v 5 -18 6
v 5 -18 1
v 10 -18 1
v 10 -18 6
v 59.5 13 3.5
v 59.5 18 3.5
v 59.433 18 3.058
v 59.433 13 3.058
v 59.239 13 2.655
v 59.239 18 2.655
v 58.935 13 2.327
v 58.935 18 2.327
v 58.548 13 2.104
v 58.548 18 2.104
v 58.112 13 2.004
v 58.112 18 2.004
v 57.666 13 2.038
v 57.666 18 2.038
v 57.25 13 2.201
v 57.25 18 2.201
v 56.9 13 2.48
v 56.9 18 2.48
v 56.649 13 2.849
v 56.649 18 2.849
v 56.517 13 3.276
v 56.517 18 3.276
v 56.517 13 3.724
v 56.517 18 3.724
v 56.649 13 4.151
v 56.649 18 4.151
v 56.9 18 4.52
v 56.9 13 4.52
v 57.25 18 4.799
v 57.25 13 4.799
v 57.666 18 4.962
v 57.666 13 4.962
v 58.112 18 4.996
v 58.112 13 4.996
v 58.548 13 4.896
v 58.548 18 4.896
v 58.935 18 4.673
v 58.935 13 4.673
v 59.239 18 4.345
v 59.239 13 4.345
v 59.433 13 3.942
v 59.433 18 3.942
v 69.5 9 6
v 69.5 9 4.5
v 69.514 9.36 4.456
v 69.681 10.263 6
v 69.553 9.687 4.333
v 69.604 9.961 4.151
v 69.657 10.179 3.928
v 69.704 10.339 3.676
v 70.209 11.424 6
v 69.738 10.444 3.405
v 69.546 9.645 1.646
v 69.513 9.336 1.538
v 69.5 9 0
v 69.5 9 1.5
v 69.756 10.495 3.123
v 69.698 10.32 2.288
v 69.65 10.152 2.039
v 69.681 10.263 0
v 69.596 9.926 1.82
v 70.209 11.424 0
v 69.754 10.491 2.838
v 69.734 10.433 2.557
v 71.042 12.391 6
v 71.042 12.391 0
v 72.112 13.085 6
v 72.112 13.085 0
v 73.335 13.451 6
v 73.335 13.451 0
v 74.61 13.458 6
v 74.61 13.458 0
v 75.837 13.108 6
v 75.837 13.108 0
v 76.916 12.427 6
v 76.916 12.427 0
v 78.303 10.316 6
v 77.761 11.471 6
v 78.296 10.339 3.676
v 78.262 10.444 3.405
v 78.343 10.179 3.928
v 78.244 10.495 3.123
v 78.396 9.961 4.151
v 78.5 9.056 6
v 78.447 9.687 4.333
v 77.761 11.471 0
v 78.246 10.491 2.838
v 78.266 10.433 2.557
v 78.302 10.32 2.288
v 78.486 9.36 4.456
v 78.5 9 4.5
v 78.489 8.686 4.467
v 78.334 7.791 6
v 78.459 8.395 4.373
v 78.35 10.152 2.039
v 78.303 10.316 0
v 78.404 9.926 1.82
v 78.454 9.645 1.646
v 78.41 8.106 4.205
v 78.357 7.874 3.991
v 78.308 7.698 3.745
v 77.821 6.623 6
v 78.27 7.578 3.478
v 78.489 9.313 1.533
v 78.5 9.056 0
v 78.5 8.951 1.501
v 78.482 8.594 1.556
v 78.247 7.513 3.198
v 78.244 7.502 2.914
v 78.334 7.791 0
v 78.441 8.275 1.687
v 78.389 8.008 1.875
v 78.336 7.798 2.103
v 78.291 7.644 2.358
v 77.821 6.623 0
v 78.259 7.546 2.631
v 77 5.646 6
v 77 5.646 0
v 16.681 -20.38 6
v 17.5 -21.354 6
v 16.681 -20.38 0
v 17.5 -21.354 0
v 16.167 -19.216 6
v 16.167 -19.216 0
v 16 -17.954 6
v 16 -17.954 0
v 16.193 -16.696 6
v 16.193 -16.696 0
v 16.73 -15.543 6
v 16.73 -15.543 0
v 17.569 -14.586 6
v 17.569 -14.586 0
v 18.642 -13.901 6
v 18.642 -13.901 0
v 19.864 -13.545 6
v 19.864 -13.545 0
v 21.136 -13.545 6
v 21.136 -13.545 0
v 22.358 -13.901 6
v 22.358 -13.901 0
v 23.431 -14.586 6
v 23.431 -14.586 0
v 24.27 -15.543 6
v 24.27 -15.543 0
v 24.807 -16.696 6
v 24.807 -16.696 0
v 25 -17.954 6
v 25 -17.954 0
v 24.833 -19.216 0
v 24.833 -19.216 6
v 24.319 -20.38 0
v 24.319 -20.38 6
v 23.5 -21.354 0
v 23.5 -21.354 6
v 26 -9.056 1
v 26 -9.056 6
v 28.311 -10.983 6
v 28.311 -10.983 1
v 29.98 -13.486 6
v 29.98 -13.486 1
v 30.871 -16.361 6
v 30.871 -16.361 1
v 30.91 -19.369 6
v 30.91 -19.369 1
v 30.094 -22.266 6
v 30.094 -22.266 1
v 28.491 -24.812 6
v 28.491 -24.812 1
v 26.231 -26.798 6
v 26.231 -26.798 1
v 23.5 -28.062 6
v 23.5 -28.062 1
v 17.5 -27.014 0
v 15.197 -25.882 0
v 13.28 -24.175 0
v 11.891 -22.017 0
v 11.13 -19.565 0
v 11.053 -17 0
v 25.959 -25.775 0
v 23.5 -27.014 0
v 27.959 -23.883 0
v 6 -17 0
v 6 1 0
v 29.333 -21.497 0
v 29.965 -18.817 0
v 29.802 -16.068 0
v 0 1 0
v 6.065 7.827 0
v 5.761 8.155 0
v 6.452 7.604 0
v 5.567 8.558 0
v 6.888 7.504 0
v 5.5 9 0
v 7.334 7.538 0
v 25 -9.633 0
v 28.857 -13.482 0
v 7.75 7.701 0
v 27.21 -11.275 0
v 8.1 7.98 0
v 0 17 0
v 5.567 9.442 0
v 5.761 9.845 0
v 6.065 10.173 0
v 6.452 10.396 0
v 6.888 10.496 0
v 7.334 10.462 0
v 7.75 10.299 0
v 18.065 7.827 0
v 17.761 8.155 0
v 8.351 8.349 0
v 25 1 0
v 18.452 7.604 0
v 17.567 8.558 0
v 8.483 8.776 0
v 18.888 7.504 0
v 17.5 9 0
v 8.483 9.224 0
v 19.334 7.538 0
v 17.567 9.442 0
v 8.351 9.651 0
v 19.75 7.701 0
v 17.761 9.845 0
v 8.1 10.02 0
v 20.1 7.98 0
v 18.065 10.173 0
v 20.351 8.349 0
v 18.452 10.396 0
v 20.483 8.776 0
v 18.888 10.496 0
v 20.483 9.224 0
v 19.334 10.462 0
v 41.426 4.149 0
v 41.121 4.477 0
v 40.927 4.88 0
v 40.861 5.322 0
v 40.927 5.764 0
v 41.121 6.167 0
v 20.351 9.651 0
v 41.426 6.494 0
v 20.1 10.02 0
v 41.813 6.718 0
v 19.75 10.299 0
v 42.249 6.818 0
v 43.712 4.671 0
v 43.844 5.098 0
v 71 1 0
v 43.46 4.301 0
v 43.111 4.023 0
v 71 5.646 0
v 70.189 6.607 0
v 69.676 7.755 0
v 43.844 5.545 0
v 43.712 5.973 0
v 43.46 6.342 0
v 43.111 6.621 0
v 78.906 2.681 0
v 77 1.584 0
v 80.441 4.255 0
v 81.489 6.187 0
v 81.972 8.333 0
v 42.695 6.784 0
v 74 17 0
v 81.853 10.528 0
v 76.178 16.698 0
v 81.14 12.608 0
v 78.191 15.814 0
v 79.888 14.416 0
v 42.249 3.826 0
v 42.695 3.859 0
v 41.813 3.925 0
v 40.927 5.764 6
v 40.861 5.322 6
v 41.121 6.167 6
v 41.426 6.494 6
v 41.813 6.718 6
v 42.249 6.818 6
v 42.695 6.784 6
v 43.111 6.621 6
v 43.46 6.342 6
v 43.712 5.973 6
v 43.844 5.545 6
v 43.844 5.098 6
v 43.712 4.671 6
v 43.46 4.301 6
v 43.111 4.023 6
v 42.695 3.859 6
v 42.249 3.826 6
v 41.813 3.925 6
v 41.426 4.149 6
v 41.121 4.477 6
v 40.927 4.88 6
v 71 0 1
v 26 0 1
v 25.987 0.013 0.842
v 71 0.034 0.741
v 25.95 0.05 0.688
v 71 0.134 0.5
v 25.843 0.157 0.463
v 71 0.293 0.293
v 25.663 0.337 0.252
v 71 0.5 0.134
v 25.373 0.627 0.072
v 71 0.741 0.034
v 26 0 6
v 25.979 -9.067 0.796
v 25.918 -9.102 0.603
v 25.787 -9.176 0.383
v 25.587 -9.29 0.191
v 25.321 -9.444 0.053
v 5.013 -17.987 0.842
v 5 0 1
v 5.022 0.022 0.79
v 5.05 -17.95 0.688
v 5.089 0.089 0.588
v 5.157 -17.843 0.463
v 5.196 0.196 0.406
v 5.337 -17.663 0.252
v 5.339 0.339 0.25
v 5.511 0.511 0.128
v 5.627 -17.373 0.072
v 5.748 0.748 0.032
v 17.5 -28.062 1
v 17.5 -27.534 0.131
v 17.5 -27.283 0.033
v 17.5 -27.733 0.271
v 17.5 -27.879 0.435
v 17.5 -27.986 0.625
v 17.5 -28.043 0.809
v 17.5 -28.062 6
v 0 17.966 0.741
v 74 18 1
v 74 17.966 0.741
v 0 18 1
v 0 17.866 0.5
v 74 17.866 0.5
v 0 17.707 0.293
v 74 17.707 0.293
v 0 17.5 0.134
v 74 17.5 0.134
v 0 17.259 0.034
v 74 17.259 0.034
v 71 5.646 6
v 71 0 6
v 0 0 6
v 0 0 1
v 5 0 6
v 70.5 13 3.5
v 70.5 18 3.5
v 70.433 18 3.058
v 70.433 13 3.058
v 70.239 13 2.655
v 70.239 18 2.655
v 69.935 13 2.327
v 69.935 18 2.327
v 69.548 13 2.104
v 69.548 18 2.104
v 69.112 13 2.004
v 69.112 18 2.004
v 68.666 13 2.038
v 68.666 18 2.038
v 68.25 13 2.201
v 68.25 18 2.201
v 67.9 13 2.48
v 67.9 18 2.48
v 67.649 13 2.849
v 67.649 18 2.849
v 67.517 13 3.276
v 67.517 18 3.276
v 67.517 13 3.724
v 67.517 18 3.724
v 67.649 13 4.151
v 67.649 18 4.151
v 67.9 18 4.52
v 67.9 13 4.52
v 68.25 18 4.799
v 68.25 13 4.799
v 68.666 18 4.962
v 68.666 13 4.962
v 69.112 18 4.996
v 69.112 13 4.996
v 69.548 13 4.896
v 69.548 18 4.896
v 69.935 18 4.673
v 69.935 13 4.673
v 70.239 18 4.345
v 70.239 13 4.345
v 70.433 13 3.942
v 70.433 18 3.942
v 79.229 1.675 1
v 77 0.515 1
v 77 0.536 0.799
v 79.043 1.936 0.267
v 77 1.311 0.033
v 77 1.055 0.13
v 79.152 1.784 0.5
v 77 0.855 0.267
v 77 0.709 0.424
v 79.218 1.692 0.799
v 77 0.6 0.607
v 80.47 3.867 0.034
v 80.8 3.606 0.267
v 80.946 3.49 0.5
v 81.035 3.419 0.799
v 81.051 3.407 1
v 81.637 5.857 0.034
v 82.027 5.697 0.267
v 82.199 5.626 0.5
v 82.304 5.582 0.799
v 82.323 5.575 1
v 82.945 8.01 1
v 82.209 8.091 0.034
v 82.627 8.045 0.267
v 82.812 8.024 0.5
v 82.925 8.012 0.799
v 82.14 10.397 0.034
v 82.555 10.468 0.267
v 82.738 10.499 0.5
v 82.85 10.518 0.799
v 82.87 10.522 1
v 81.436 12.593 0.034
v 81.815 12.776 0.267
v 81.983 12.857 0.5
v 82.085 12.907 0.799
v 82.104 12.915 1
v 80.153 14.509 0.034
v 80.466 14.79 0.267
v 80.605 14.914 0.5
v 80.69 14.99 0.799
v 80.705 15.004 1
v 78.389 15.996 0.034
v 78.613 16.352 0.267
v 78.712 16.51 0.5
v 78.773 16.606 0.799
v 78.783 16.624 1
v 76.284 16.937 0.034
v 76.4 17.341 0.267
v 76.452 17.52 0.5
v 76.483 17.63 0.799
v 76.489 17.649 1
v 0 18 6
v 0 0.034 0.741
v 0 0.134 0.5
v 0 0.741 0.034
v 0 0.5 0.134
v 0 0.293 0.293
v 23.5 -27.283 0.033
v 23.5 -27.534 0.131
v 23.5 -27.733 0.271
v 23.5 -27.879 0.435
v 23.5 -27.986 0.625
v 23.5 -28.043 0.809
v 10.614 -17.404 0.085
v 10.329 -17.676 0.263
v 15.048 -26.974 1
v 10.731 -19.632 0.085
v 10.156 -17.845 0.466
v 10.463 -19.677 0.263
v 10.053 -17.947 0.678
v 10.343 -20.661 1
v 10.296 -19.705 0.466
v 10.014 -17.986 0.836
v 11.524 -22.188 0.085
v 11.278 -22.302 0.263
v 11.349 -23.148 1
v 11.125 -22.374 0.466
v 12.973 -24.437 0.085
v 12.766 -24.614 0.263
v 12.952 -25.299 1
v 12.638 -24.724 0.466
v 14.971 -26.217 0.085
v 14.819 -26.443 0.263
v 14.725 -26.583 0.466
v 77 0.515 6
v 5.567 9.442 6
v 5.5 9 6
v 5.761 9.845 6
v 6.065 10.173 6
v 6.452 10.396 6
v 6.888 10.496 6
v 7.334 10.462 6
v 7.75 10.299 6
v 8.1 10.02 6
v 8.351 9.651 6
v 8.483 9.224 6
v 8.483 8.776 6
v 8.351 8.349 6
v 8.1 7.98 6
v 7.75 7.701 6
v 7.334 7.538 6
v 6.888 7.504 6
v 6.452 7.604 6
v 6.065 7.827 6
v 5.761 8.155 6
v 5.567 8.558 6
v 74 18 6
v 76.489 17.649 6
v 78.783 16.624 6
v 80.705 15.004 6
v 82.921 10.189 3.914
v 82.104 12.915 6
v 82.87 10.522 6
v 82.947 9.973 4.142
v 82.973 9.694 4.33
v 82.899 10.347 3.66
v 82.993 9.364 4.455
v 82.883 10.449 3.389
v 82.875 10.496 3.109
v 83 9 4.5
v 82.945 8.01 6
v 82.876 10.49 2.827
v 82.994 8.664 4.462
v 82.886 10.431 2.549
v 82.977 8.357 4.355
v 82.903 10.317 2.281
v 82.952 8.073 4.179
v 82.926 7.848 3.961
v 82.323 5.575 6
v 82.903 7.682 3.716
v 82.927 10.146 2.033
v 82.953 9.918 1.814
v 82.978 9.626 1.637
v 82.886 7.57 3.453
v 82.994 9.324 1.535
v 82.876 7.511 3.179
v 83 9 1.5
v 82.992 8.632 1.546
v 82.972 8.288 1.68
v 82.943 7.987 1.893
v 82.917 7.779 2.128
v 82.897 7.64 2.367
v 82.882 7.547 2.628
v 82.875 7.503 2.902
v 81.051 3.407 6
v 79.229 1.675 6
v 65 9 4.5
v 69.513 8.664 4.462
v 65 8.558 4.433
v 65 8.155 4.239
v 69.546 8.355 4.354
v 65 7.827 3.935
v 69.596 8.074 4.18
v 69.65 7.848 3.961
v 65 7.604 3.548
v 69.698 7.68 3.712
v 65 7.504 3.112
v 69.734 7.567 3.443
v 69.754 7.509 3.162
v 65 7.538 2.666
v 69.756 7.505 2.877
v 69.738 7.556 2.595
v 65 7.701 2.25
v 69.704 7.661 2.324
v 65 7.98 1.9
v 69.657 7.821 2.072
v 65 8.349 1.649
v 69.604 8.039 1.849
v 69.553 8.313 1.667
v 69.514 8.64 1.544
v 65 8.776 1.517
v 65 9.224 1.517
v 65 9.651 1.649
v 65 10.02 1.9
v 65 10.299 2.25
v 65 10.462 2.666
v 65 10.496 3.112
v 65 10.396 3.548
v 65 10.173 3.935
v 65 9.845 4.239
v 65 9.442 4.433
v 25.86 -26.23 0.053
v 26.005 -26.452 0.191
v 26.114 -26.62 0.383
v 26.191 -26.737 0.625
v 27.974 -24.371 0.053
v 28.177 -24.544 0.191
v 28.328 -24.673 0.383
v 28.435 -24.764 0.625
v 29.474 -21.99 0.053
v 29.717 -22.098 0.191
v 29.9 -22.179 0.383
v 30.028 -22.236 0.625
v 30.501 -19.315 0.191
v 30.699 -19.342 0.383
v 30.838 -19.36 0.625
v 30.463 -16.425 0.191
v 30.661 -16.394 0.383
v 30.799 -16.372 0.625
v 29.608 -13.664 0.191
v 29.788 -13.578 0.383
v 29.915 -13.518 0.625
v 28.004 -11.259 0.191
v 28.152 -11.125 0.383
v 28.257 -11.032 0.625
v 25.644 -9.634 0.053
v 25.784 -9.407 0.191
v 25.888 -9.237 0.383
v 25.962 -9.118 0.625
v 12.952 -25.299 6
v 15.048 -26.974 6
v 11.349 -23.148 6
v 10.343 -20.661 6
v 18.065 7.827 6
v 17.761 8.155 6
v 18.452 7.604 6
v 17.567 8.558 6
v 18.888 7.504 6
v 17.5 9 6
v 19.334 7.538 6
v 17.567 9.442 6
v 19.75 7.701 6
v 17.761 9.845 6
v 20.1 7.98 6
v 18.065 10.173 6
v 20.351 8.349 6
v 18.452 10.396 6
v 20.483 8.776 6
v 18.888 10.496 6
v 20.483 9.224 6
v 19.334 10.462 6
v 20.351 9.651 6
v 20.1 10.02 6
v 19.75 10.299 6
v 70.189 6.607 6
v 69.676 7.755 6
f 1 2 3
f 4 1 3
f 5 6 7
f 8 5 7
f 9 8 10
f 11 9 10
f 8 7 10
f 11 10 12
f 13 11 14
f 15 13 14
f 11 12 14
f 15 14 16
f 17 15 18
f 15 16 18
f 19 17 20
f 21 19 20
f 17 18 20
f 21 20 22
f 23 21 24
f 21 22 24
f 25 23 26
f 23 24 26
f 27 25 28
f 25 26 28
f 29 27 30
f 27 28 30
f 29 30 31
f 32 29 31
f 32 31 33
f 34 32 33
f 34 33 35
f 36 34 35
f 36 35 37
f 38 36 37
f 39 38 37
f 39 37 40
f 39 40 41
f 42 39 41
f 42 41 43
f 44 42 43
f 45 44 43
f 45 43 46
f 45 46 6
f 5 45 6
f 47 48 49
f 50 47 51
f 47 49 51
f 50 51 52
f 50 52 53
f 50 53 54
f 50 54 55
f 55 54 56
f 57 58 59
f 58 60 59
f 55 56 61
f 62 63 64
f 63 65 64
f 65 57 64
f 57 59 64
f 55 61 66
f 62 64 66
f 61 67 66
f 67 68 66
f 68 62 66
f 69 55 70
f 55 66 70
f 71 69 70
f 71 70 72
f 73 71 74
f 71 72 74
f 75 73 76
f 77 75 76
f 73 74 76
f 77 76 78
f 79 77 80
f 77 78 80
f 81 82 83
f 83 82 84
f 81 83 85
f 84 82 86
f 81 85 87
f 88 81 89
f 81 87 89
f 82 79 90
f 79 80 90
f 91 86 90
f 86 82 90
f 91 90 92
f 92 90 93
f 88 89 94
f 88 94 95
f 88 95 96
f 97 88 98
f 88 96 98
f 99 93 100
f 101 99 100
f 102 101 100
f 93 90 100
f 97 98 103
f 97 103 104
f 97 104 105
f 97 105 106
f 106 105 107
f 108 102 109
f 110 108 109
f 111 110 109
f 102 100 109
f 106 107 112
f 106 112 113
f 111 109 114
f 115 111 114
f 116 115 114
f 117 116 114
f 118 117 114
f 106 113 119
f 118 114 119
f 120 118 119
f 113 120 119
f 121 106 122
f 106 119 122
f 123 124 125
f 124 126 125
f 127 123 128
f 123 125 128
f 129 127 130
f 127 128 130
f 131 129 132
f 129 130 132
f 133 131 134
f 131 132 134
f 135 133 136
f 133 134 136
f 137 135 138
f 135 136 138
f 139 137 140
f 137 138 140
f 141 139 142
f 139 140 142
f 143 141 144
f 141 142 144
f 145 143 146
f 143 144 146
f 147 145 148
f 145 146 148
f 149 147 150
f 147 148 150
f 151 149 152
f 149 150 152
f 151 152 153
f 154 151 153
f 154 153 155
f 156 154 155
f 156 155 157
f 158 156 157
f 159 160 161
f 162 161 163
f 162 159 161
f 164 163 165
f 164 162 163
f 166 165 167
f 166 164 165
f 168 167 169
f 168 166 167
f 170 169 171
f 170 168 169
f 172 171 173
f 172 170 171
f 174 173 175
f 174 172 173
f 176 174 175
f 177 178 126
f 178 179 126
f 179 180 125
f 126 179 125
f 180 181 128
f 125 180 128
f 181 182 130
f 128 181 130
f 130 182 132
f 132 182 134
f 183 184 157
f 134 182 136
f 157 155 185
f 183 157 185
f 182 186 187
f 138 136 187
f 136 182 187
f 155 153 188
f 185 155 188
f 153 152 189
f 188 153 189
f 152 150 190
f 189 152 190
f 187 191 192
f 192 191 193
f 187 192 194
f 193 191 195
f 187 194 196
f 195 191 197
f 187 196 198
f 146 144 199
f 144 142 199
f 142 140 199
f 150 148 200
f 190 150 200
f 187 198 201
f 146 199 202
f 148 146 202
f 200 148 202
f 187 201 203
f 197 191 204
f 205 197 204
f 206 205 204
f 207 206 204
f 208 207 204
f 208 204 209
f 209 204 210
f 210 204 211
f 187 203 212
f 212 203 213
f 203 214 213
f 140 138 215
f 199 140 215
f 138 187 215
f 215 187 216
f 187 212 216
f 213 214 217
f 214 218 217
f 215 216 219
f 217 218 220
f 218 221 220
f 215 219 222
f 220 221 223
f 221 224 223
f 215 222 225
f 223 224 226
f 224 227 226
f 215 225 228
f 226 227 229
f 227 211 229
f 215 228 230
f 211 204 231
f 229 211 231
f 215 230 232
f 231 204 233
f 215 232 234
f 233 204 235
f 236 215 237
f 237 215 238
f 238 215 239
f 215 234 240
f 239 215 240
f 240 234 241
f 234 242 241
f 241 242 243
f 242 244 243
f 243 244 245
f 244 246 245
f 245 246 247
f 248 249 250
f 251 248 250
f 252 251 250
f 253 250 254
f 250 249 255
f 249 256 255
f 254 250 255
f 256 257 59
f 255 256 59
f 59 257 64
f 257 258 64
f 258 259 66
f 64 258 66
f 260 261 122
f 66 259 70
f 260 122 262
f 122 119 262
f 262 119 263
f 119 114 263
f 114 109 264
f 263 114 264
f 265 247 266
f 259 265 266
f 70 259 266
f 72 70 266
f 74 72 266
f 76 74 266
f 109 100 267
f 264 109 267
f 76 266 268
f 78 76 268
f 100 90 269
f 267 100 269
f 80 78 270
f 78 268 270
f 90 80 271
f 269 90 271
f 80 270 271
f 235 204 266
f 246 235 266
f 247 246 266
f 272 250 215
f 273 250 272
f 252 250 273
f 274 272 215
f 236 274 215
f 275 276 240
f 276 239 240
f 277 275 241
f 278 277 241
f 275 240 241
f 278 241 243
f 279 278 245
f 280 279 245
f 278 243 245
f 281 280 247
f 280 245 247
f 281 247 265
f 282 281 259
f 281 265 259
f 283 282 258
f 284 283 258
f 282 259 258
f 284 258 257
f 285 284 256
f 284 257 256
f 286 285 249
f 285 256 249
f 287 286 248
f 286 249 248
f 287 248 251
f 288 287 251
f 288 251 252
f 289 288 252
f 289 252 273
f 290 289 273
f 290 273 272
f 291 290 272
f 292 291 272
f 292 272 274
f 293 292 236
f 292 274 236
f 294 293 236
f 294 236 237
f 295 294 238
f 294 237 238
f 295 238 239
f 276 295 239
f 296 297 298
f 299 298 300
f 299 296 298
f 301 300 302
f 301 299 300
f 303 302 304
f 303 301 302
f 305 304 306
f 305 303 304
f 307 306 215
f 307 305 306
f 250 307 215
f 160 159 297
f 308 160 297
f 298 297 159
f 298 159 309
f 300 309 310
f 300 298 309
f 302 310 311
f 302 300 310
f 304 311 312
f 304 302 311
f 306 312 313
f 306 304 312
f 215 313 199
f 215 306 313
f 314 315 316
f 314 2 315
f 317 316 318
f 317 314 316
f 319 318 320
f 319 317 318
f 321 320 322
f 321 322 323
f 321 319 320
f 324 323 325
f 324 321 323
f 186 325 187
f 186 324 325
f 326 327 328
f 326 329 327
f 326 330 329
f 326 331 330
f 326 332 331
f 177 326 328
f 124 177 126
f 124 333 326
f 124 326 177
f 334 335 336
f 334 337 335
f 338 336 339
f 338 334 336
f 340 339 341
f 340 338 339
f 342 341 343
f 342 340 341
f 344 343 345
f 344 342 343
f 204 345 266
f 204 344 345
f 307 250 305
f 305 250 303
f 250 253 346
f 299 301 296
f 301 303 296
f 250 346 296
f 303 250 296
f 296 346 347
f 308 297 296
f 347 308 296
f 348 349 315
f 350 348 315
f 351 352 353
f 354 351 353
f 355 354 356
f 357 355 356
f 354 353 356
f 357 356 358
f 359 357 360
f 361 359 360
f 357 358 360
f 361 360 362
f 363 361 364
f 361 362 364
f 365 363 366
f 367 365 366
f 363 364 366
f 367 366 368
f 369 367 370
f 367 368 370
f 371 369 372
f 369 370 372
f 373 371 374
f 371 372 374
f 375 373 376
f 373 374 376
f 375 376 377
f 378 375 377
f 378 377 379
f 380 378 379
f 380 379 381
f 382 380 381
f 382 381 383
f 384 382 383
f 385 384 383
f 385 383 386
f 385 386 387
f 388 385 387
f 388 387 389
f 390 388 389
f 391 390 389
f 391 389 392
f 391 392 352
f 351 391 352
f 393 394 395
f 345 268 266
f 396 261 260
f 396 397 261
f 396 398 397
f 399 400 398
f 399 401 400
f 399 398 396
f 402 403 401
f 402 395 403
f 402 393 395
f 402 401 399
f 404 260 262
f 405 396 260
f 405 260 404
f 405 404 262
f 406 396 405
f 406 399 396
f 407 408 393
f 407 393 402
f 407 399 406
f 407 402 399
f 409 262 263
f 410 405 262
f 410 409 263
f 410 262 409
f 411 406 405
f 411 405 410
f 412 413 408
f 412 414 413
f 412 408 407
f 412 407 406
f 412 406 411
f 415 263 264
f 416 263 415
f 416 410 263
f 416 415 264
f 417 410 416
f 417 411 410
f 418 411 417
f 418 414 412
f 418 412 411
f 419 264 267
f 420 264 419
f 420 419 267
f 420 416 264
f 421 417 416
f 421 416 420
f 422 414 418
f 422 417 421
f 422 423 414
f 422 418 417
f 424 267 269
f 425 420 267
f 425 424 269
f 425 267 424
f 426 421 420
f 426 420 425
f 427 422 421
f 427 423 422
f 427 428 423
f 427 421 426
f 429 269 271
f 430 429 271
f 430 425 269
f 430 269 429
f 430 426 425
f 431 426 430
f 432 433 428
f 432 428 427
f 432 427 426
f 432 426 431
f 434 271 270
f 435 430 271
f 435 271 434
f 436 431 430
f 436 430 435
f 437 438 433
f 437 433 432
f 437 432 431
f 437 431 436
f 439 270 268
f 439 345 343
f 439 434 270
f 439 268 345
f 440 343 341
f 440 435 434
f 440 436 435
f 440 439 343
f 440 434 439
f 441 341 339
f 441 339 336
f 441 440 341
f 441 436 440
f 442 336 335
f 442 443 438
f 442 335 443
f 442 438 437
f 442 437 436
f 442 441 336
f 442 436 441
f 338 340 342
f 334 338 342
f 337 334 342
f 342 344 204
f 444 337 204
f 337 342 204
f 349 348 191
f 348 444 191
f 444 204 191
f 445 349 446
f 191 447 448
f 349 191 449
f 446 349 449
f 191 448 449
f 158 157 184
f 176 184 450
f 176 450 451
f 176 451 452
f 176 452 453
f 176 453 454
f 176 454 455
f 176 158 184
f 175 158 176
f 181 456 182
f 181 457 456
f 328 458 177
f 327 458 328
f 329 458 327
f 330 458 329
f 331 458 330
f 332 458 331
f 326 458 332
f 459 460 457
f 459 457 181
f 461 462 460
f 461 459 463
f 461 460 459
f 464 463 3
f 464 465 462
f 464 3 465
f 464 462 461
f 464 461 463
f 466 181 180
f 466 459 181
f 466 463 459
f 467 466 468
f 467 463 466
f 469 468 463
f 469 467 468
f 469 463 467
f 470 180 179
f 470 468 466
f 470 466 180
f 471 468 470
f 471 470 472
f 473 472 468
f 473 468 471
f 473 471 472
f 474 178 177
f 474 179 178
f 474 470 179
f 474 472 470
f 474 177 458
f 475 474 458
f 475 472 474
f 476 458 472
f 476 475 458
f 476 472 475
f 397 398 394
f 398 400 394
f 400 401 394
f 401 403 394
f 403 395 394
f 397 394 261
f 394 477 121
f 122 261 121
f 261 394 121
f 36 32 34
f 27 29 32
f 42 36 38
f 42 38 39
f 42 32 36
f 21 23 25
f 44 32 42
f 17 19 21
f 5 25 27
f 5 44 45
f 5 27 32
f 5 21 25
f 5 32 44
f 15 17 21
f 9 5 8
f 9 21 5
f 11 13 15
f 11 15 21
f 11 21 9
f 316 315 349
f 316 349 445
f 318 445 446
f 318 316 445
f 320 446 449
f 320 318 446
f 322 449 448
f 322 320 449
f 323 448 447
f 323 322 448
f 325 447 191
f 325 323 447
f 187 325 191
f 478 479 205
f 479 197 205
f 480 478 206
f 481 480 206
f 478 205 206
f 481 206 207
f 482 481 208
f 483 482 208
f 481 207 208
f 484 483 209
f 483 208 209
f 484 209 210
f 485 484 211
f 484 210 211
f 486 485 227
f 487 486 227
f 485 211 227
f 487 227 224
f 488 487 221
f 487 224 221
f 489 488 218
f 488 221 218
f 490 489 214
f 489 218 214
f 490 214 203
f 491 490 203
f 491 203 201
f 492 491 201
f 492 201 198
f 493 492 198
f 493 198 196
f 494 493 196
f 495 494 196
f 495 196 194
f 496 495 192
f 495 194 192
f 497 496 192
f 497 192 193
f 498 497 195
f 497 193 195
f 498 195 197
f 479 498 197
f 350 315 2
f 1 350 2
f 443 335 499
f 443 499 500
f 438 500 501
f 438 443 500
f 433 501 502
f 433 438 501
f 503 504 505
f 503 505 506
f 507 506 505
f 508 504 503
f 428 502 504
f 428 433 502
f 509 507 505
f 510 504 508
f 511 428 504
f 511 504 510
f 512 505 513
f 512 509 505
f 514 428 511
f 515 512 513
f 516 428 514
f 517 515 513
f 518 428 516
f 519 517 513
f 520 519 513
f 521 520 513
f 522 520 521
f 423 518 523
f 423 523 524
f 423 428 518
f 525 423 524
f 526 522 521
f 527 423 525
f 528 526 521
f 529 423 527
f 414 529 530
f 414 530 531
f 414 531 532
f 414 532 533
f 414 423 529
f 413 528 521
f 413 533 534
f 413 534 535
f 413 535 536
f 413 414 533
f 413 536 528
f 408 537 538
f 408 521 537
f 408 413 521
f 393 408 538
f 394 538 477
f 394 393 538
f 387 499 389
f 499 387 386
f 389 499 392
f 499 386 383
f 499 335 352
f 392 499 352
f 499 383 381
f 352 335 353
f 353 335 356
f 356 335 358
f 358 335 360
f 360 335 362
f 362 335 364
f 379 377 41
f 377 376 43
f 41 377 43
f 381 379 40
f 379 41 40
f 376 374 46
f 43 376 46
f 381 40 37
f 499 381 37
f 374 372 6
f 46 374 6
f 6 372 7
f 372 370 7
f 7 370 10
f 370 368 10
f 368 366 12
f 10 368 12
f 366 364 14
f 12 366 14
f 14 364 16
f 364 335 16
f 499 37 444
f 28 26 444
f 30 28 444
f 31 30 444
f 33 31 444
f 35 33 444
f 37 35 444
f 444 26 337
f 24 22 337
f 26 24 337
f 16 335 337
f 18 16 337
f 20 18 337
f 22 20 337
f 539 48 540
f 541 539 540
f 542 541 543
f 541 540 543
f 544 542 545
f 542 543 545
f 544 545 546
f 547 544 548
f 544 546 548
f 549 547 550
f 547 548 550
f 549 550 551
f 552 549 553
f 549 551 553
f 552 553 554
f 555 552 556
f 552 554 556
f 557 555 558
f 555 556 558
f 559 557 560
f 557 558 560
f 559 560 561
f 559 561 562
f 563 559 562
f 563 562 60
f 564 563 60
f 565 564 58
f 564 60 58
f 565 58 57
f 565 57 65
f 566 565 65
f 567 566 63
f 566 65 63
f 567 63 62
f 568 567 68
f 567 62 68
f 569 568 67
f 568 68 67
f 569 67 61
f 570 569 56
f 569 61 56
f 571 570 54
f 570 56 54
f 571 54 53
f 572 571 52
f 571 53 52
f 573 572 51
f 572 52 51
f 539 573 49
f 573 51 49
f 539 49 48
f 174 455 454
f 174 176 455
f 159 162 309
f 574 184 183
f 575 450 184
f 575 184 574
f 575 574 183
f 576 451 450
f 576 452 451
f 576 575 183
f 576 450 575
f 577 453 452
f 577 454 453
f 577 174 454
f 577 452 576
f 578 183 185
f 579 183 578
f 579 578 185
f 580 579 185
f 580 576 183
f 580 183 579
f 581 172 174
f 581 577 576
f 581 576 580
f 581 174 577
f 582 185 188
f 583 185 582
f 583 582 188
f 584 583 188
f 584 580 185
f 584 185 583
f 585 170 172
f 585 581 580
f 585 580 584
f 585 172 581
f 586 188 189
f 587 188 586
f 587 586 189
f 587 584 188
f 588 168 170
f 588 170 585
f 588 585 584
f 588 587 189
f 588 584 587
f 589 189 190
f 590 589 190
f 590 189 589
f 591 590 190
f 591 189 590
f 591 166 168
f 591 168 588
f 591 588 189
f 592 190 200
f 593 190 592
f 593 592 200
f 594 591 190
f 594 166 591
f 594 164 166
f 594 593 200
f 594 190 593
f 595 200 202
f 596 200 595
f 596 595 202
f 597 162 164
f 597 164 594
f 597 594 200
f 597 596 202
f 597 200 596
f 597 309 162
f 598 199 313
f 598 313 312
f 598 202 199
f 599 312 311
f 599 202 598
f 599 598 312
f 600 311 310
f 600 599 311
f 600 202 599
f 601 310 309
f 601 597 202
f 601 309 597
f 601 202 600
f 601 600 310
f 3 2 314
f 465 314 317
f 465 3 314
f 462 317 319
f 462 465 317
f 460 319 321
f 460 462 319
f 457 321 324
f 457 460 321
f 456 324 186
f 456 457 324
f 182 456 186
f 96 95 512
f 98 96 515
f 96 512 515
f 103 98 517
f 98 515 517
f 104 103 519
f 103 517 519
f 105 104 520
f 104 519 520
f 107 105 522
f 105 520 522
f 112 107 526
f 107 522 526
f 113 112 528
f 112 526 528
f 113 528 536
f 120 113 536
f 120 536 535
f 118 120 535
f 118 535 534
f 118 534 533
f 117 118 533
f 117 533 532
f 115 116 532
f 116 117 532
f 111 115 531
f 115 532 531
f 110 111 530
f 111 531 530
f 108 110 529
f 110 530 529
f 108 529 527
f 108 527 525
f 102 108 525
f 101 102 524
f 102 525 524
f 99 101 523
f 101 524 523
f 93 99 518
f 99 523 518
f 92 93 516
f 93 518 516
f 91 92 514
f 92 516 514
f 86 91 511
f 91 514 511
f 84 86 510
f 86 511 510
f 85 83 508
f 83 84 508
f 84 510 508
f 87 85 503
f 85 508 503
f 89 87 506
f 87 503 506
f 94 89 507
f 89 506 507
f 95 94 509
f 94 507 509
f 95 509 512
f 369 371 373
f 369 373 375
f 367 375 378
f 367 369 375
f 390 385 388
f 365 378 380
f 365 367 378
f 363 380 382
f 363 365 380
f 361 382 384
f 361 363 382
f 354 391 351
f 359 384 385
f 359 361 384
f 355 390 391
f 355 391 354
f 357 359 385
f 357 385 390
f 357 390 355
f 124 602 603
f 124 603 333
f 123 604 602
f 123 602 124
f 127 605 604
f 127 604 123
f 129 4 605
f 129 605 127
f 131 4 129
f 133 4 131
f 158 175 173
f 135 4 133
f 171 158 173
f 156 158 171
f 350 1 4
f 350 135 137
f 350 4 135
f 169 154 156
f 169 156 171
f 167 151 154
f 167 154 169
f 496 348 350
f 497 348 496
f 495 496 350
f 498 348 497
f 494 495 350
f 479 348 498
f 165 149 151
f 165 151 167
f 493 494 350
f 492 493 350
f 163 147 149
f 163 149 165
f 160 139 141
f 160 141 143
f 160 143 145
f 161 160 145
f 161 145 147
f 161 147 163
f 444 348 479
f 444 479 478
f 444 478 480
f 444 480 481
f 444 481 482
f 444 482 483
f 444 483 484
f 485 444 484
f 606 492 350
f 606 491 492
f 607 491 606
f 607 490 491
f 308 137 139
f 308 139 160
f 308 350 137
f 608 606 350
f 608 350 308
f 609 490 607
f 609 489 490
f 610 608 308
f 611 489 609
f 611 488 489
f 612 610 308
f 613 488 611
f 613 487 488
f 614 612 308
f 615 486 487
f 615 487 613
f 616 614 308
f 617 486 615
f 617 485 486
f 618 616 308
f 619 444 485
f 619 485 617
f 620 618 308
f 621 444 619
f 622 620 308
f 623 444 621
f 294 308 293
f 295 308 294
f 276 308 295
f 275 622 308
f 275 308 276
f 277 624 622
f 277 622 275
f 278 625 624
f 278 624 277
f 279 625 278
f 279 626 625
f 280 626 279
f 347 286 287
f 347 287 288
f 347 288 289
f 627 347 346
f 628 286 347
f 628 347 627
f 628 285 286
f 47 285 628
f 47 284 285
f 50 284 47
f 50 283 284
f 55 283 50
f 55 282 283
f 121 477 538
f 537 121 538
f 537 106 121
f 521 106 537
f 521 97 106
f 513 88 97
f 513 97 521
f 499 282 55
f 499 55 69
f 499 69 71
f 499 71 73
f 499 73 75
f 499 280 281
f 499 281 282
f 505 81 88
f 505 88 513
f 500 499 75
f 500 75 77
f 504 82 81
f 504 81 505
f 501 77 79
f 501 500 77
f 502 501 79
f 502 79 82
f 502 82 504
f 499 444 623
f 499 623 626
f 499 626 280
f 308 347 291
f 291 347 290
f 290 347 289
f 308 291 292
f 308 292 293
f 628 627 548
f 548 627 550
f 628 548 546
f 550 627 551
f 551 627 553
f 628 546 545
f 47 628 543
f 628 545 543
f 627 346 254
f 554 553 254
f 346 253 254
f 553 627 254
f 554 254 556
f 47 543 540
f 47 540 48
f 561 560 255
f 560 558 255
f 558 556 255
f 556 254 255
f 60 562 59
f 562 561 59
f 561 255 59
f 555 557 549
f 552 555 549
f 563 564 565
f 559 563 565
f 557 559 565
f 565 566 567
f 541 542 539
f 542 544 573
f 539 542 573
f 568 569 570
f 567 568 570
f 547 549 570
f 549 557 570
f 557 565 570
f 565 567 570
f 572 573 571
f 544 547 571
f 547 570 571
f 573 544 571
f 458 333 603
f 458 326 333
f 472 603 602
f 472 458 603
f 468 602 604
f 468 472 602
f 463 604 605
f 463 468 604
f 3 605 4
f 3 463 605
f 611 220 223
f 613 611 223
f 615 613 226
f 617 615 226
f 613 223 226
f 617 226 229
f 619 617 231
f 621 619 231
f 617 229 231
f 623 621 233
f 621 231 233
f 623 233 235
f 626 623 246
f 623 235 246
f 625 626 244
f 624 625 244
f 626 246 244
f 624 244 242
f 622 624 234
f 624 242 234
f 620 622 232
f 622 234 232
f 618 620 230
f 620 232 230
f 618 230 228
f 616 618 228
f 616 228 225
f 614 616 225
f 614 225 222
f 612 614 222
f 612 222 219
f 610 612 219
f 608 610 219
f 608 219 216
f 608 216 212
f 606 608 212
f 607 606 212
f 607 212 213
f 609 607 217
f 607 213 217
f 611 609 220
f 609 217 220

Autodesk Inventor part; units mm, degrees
ref_plane "YZ Plane" through (0, 0, 0) normal (1, 0, 0) x (0, 1, 0)
ref_plane "XZ Plane" through (0, 0, 0) normal (0, 1, 0) x (-1, 0, 0)
sketch "Sketch1" plane through (0, 0, 0) normal (0, 0, 1) x (1, 0, 0)
  line L0 (0, 0) -> (5, 0)
  line L1 (5, 0) -> (5, -18)
  line L2 (5, -18) -> (26, -18)
  line L3 (26, -18) -> (26, 0)
  line L4 (26, 0) -> (74, 0)
  arc A0 (74, 0) -> (74, 18) centre (74, 9) ccw
  line L5 (74, 18) -> (0, 18)
  line L6 (0, 18) -> (0, 0)
  circle A1 centre (20.5, -18) radius 10.5
  dimension "d0" = 5
  dimension "d1" = 18
  dimension "d2" = 21
  dimension "d3" = 18
  dimension "d4" = 48
  dimension "d5" = 18
  dimension "d6" = 9
  dimension "d7" = 74
  dimension "d8" = 21
extrude "Extrusion1" add sketch "Sketch1" along normal blind 6
sketch "Sketch2" plane through (0, 0, 0) normal (0, 0, -1) x (-1, 0, 0)
  circle A0 centre (-74, 9) radius 4.5
  arc A1 (-26, -9.0557) -> (-10, -18) centre (-20.5, -18) ccw projected
  circle A2 centre (-20.5, -18) radius 4.5
  point P0 (0, 0)
  dimension "d11" = 9
  dimension "d12" = 9
extrude "Extrusion2" cut sketch "Sketch2" against normal through all
sketch "Sketch3" plane through (0, 0, 0) normal (0, 0, -1) x (-1, 0, 0)
  circle A0 centre (-7, 9) radius 1.5
  circle A1 centre (-19, 9) radius 1.5
  point P0 (0, 0)
  dimension "d16" = 3
  dimension "d17" = 3
extrude "Extrusion3" cut sketch "Sketch3" against normal through all
ref_plane "Work Plane1" through (83, 0, 0) normal (-1, 0, 0) x (0, 0, 1)
sketch "Sketch4" plane through (83, 0, 0) normal (-1, 0, 0) x (0, 0, 1)
  circle A0 centre (3, 9) radius 1.5
  point P0 (0, 0)
  dimension "d22" = 3
extrude "Extrusion4" cut sketch "Sketch4" along normal blind 18
fillet "Fillet3" radius 1 8 edges at (83, 9, 0) (50, 0, 0) (37, 18, 0) (2.5, 0, 0) (5, -9, 0) (25.6235, -27.1652, 0) (7.5, -18, 0) (26, -4.5279, 0)
sketch "Sketch5" plane through (0, 18, 6) normal (0, 1, 0) x (1, 0, 0)
  circle A0 centre (69, 2.5) radius 1.5
  circle A1 centre (58, 2.5) radius 1.5
  point P0 (0, 6)
  dimension "d26" = 3
  dimension "d27" = 3
extrude "Extrusion5" cut sketch "Sketch5" against normal blind 5
sketch "Sketch6" plane through (0, 0, 6) normal (0, 0, 1) x (1, 0, 0)
  line L0 (71, 0) -> (77, 0)
  line L1 (77, 0) -> (77, 6)
  line L2 (77, 6) -> (71, 6)
  line L3 (71, 6) -> (71, 0)
  line L4 (17.5, -18) -> (23.5, -18)
  line L5 (23.5, -18) -> (23.5, -29)
  line L6 (23.5, -29) -> (17.5, -29)
  line L7 (17.5, -29) -> (17.5, -18)
  point P0 (0, 0)
  dimension "d30" = 6
  dimension "d31" = 6
  dimension "d32" = 6
  dimension "d33" = 11
extrude "Extrusion6" cut sketch "Sketch6" against normal through all
sketch "Sketch7" plane through (0, 0, 0) normal (0, 0, -1) x (-1, 0, 0)
  arc A0 (-38.7148, 11.0023) -> (-38.2652, 13.3358) centre (-45.6076, 13.5402) ccw projected
  arc A1 (-38.1755, 10.6175) -> (-38.7148, 11.0023) centre (-42.3608, 5.3217) ccw projected
  arc A2 (-36.1152, 11.8018) -> (-38.1755, 10.6175) centre (-33.5331, 4.9255) ccw projected
  arc A3 (-35.5101, 11.1585) -> (-36.1152, 11.8018) centre (-42.3608, 5.3217) ccw projected
  arc A4 (-36.8185, 9.1746) -> (-35.5101, 11.1585) centre (-42.2153, 14.1571) ccw projected
  arc A5 (-36.4675, 8.6128) -> (-36.8185, 9.1746) centre (-42.3608, 5.3217) ccw projected
  arc A6 (-34.1108, 8.9185) -> (-36.4675, 8.6128) centre (-34.3567, 1.5774) ccw projected
  arc A7 (-33.798, 8.0925) -> (-34.1108, 8.9185) centre (-42.3608, 5.3217) ccw projected
  arc A8 (-35.7659, 6.7603) -> (-33.798, 8.0925) centre (-38.8453, 13.4288) ccw projected
  arc A9 (-35.6566, 6.107) -> (-35.7659, 6.7603) centre (-42.3608, 5.3217) ccw projected
  arc A10 (-33.3623, 5.4875) -> (-35.6566, 6.107) centre (-36.3988, -1.2006) ccw projected
  arc A11 (-33.3894, 4.6047) -> (-33.3623, 5.4875) centre (-42.3608, 5.3217) ccw projected
  arc A12 (-35.7174, 4.1271) -> (-33.3894, 4.6047) centre (-36.0104, 11.4664) ccw projected
  arc A13 (-35.8664, 3.4816) -> (-35.7174, 4.1271) centre (-42.3608, 5.3217) ccw projected
  arc A14 (-33.9838, 2.0314) -> (-35.8664, 3.4816) centre (-39.3486, -2.9857) ccw projected
  arc A15 (-34.3467, 1.2261) -> (-33.9838, 2.0314) centre (-42.3608, 5.3217) ccw projected
  arc A16 (-36.6802, 1.6757) -> (-34.3467, 1.2261) centre (-34.1423, 8.5684) ccw projected
  arc A17 (-37.0649, 1.1364) -> (-36.6802, 1.6757) centre (-42.3608, 5.3217) ccw projected
  arc A18 (-35.8806, -0.9239) -> (-37.0649, 1.1364) centre (-42.757, -3.506) ccw projected
  arc A19 (-36.524, -1.529) -> (-35.8806, -0.9239) centre (-42.3608, 5.3217) ccw projected
  arc A20 (-38.5079, -0.2207) -> (-36.524, -1.529) centre (-33.5254, 5.1762) ccw projected
  arc A21 (-39.0697, -0.5716) -> (-38.5079, -0.2207) centre (-42.3608, 5.3217) ccw projected
  arc A22 (-38.764, -2.9284) -> (-39.0697, -0.5716) centre (-46.105, -2.6824) ccw projected
  arc A23 (-39.59, -3.2412) -> (-38.764, -2.9284) centre (-42.3608, 5.3217) ccw projected
  arc A24 (-40.9222, -1.2732) -> (-39.59, -3.2412) centre (-34.2536, 1.8061) ccw projected
  arc A25 (-41.5755, -1.3825) -> (-40.9222, -1.2732) centre (-42.3608, 5.3217) ccw projected
  arc A26 (-42.1949, -3.6768) -> (-41.5755, -1.3825) centre (-48.8831, -0.6403) ccw projected
  arc A27 (-43.0777, -3.6497) -> (-42.1949, -3.6768) centre (-42.3608, 5.3217) ccw projected
  arc A28 (-43.5554, -1.3218) -> (-43.0777, -3.6497) centre (-36.2161, -1.0287) ccw projected
  arc A29 (-44.2008, -1.1727) -> (-43.5554, -1.3218) centre (-42.3608, 5.3217) ccw projected
  arc A30 (-45.6511, -3.0553) -> (-44.2008, -1.1727) centre (-50.6681, 2.3095) ccw projected
  arc A31 (-46.4564, -2.6925) -> (-45.6511, -3.0553) centre (-42.3608, 5.3217) ccw projected
  arc A32 (-46.0068, -0.3589) -> (-46.4564, -2.6925) centre (-39.114, -2.8968) ccw projected
  arc A33 (-46.5461, 0.0258) -> (-46.0068, -0.3589) centre (-42.3608, 5.3217) ccw projected
  arc A34 (-48.6064, -1.1585) -> (-46.5461, 0.0258) centre (-51.1885, 5.7179) ccw projected
  arc A35 (-49.2115, -0.5151) -> (-48.6064, -1.1585) centre (-42.3608, 5.3217) ccw projected
  arc A36 (-47.9032, 1.4688) -> (-49.2115, -0.5151) centre (-42.5063, -3.5137) ccw projected
  arc A37 (-48.2541, 2.0306) -> (-47.9032, 1.4688) centre (-42.3608, 5.3217) ccw projected
  arc A38 (-50.6108, 1.7249) -> (-48.2541, 2.0306) centre (-50.3649, 9.0659) ccw projected
  arc A39 (-50.9237, 2.5508) -> (-50.6108, 1.7249) centre (-42.3608, 5.3217) ccw projected
  arc A40 (-48.9557, 3.883) -> (-50.9237, 2.5508) centre (-45.8763, -2.7855) ccw projected
  arc A41 (-49.065, 4.5364) -> (-48.9557, 3.883) centre (-42.3608, 5.3217) ccw projected
  arc A42 (-51.3593, 5.1558) -> (-49.065, 4.5364) centre (-48.3228, 11.8439) ccw projected
  arc A43 (-51.3322, 6.0386) -> (-51.3593, 5.1558) centre (-42.3608, 5.3217) ccw projected
  arc A44 (-49.0043, 6.5163) -> (-51.3322, 6.0386) centre (-48.7112, -0.823) ccw projected
  arc A45 (-48.8552, 7.1617) -> (-49.0043, 6.5163) centre (-42.3608, 5.3217) ccw projected
  arc A46 (-50.7378, 8.612) -> (-48.8552, 7.1617) centre (-45.373, 13.629) ccw projected
  arc A47 (-50.3749, 9.4172) -> (-50.7378, 8.612) centre (-42.3608, 5.3217) ccw projected
  arc A48 (-48.0414, 8.9677) -> (-50.3749, 9.4172) centre (-50.5793, 2.0749) ccw projected
  arc A49 (-47.6567, 9.5069) -> (-48.0414, 8.9677) centre (-42.3608, 5.3217) ccw projected
  arc A50 (-48.841, 11.5673) -> (-47.6567, 9.5069) centre (-41.9646, 14.1494) ccw projected
  arc A51 (-48.1976, 12.1724) -> (-48.841, 11.5673) centre (-42.3608, 5.3217) ccw projected
  arc A52 (-46.2137, 10.864) -> (-48.1976, 12.1724) centre (-51.1962, 5.4671) ccw projected
  arc A53 (-45.6519, 11.215) -> (-46.2137, 10.864) centre (-42.3608, 5.3217) ccw projected
  arc A54 (-45.9576, 13.5717) -> (-45.6519, 11.215) centre (-38.6166, 13.3258) ccw projected
  arc A55 (-45.1317, 13.8845) -> (-45.9576, 13.5717) centre (-42.3608, 5.3217) ccw projected
  arc A56 (-43.7995, 11.9166) -> (-45.1317, 13.8845) centre (-50.468, 8.8372) ccw projected
  arc A57 (-43.1461, 12.0258) -> (-43.7995, 11.9166) centre (-42.3608, 5.3217) ccw projected
  arc A58 (-42.5267, 14.3201) -> (-43.1461, 12.0258) centre (-35.8385, 11.2837) ccw projected
  arc A59 (-41.6439, 14.2931) -> (-42.5267, 14.3201) centre (-42.3608, 5.3217) ccw projected
  arc A60 (-41.1662, 11.9651) -> (-41.6439, 14.2931) centre (-48.5055, 11.6721) ccw projected
  arc A61 (-40.5208, 11.816) -> (-41.1662, 11.9651) centre (-42.3608, 5.3217) ccw projected
  arc A62 (-39.0705, 13.6987) -> (-40.5208, 11.816) centre (-34.0535, 8.3339) ccw projected
  arc A63 (-38.2652, 13.3358) -> (-39.0705, 13.6987) centre (-42.3608, 5.3217) ccw projected
  circle A64 centre (-42.3608, 5.3217) radius 1.5
  point P0 (0, 0)
  dimension "d36" = 3
extrude "Extrusion7" cut sketch "Sketch7" against normal through all contours A64
properties part number "Hand - Digit 0-1" material "ABS Plastic"
